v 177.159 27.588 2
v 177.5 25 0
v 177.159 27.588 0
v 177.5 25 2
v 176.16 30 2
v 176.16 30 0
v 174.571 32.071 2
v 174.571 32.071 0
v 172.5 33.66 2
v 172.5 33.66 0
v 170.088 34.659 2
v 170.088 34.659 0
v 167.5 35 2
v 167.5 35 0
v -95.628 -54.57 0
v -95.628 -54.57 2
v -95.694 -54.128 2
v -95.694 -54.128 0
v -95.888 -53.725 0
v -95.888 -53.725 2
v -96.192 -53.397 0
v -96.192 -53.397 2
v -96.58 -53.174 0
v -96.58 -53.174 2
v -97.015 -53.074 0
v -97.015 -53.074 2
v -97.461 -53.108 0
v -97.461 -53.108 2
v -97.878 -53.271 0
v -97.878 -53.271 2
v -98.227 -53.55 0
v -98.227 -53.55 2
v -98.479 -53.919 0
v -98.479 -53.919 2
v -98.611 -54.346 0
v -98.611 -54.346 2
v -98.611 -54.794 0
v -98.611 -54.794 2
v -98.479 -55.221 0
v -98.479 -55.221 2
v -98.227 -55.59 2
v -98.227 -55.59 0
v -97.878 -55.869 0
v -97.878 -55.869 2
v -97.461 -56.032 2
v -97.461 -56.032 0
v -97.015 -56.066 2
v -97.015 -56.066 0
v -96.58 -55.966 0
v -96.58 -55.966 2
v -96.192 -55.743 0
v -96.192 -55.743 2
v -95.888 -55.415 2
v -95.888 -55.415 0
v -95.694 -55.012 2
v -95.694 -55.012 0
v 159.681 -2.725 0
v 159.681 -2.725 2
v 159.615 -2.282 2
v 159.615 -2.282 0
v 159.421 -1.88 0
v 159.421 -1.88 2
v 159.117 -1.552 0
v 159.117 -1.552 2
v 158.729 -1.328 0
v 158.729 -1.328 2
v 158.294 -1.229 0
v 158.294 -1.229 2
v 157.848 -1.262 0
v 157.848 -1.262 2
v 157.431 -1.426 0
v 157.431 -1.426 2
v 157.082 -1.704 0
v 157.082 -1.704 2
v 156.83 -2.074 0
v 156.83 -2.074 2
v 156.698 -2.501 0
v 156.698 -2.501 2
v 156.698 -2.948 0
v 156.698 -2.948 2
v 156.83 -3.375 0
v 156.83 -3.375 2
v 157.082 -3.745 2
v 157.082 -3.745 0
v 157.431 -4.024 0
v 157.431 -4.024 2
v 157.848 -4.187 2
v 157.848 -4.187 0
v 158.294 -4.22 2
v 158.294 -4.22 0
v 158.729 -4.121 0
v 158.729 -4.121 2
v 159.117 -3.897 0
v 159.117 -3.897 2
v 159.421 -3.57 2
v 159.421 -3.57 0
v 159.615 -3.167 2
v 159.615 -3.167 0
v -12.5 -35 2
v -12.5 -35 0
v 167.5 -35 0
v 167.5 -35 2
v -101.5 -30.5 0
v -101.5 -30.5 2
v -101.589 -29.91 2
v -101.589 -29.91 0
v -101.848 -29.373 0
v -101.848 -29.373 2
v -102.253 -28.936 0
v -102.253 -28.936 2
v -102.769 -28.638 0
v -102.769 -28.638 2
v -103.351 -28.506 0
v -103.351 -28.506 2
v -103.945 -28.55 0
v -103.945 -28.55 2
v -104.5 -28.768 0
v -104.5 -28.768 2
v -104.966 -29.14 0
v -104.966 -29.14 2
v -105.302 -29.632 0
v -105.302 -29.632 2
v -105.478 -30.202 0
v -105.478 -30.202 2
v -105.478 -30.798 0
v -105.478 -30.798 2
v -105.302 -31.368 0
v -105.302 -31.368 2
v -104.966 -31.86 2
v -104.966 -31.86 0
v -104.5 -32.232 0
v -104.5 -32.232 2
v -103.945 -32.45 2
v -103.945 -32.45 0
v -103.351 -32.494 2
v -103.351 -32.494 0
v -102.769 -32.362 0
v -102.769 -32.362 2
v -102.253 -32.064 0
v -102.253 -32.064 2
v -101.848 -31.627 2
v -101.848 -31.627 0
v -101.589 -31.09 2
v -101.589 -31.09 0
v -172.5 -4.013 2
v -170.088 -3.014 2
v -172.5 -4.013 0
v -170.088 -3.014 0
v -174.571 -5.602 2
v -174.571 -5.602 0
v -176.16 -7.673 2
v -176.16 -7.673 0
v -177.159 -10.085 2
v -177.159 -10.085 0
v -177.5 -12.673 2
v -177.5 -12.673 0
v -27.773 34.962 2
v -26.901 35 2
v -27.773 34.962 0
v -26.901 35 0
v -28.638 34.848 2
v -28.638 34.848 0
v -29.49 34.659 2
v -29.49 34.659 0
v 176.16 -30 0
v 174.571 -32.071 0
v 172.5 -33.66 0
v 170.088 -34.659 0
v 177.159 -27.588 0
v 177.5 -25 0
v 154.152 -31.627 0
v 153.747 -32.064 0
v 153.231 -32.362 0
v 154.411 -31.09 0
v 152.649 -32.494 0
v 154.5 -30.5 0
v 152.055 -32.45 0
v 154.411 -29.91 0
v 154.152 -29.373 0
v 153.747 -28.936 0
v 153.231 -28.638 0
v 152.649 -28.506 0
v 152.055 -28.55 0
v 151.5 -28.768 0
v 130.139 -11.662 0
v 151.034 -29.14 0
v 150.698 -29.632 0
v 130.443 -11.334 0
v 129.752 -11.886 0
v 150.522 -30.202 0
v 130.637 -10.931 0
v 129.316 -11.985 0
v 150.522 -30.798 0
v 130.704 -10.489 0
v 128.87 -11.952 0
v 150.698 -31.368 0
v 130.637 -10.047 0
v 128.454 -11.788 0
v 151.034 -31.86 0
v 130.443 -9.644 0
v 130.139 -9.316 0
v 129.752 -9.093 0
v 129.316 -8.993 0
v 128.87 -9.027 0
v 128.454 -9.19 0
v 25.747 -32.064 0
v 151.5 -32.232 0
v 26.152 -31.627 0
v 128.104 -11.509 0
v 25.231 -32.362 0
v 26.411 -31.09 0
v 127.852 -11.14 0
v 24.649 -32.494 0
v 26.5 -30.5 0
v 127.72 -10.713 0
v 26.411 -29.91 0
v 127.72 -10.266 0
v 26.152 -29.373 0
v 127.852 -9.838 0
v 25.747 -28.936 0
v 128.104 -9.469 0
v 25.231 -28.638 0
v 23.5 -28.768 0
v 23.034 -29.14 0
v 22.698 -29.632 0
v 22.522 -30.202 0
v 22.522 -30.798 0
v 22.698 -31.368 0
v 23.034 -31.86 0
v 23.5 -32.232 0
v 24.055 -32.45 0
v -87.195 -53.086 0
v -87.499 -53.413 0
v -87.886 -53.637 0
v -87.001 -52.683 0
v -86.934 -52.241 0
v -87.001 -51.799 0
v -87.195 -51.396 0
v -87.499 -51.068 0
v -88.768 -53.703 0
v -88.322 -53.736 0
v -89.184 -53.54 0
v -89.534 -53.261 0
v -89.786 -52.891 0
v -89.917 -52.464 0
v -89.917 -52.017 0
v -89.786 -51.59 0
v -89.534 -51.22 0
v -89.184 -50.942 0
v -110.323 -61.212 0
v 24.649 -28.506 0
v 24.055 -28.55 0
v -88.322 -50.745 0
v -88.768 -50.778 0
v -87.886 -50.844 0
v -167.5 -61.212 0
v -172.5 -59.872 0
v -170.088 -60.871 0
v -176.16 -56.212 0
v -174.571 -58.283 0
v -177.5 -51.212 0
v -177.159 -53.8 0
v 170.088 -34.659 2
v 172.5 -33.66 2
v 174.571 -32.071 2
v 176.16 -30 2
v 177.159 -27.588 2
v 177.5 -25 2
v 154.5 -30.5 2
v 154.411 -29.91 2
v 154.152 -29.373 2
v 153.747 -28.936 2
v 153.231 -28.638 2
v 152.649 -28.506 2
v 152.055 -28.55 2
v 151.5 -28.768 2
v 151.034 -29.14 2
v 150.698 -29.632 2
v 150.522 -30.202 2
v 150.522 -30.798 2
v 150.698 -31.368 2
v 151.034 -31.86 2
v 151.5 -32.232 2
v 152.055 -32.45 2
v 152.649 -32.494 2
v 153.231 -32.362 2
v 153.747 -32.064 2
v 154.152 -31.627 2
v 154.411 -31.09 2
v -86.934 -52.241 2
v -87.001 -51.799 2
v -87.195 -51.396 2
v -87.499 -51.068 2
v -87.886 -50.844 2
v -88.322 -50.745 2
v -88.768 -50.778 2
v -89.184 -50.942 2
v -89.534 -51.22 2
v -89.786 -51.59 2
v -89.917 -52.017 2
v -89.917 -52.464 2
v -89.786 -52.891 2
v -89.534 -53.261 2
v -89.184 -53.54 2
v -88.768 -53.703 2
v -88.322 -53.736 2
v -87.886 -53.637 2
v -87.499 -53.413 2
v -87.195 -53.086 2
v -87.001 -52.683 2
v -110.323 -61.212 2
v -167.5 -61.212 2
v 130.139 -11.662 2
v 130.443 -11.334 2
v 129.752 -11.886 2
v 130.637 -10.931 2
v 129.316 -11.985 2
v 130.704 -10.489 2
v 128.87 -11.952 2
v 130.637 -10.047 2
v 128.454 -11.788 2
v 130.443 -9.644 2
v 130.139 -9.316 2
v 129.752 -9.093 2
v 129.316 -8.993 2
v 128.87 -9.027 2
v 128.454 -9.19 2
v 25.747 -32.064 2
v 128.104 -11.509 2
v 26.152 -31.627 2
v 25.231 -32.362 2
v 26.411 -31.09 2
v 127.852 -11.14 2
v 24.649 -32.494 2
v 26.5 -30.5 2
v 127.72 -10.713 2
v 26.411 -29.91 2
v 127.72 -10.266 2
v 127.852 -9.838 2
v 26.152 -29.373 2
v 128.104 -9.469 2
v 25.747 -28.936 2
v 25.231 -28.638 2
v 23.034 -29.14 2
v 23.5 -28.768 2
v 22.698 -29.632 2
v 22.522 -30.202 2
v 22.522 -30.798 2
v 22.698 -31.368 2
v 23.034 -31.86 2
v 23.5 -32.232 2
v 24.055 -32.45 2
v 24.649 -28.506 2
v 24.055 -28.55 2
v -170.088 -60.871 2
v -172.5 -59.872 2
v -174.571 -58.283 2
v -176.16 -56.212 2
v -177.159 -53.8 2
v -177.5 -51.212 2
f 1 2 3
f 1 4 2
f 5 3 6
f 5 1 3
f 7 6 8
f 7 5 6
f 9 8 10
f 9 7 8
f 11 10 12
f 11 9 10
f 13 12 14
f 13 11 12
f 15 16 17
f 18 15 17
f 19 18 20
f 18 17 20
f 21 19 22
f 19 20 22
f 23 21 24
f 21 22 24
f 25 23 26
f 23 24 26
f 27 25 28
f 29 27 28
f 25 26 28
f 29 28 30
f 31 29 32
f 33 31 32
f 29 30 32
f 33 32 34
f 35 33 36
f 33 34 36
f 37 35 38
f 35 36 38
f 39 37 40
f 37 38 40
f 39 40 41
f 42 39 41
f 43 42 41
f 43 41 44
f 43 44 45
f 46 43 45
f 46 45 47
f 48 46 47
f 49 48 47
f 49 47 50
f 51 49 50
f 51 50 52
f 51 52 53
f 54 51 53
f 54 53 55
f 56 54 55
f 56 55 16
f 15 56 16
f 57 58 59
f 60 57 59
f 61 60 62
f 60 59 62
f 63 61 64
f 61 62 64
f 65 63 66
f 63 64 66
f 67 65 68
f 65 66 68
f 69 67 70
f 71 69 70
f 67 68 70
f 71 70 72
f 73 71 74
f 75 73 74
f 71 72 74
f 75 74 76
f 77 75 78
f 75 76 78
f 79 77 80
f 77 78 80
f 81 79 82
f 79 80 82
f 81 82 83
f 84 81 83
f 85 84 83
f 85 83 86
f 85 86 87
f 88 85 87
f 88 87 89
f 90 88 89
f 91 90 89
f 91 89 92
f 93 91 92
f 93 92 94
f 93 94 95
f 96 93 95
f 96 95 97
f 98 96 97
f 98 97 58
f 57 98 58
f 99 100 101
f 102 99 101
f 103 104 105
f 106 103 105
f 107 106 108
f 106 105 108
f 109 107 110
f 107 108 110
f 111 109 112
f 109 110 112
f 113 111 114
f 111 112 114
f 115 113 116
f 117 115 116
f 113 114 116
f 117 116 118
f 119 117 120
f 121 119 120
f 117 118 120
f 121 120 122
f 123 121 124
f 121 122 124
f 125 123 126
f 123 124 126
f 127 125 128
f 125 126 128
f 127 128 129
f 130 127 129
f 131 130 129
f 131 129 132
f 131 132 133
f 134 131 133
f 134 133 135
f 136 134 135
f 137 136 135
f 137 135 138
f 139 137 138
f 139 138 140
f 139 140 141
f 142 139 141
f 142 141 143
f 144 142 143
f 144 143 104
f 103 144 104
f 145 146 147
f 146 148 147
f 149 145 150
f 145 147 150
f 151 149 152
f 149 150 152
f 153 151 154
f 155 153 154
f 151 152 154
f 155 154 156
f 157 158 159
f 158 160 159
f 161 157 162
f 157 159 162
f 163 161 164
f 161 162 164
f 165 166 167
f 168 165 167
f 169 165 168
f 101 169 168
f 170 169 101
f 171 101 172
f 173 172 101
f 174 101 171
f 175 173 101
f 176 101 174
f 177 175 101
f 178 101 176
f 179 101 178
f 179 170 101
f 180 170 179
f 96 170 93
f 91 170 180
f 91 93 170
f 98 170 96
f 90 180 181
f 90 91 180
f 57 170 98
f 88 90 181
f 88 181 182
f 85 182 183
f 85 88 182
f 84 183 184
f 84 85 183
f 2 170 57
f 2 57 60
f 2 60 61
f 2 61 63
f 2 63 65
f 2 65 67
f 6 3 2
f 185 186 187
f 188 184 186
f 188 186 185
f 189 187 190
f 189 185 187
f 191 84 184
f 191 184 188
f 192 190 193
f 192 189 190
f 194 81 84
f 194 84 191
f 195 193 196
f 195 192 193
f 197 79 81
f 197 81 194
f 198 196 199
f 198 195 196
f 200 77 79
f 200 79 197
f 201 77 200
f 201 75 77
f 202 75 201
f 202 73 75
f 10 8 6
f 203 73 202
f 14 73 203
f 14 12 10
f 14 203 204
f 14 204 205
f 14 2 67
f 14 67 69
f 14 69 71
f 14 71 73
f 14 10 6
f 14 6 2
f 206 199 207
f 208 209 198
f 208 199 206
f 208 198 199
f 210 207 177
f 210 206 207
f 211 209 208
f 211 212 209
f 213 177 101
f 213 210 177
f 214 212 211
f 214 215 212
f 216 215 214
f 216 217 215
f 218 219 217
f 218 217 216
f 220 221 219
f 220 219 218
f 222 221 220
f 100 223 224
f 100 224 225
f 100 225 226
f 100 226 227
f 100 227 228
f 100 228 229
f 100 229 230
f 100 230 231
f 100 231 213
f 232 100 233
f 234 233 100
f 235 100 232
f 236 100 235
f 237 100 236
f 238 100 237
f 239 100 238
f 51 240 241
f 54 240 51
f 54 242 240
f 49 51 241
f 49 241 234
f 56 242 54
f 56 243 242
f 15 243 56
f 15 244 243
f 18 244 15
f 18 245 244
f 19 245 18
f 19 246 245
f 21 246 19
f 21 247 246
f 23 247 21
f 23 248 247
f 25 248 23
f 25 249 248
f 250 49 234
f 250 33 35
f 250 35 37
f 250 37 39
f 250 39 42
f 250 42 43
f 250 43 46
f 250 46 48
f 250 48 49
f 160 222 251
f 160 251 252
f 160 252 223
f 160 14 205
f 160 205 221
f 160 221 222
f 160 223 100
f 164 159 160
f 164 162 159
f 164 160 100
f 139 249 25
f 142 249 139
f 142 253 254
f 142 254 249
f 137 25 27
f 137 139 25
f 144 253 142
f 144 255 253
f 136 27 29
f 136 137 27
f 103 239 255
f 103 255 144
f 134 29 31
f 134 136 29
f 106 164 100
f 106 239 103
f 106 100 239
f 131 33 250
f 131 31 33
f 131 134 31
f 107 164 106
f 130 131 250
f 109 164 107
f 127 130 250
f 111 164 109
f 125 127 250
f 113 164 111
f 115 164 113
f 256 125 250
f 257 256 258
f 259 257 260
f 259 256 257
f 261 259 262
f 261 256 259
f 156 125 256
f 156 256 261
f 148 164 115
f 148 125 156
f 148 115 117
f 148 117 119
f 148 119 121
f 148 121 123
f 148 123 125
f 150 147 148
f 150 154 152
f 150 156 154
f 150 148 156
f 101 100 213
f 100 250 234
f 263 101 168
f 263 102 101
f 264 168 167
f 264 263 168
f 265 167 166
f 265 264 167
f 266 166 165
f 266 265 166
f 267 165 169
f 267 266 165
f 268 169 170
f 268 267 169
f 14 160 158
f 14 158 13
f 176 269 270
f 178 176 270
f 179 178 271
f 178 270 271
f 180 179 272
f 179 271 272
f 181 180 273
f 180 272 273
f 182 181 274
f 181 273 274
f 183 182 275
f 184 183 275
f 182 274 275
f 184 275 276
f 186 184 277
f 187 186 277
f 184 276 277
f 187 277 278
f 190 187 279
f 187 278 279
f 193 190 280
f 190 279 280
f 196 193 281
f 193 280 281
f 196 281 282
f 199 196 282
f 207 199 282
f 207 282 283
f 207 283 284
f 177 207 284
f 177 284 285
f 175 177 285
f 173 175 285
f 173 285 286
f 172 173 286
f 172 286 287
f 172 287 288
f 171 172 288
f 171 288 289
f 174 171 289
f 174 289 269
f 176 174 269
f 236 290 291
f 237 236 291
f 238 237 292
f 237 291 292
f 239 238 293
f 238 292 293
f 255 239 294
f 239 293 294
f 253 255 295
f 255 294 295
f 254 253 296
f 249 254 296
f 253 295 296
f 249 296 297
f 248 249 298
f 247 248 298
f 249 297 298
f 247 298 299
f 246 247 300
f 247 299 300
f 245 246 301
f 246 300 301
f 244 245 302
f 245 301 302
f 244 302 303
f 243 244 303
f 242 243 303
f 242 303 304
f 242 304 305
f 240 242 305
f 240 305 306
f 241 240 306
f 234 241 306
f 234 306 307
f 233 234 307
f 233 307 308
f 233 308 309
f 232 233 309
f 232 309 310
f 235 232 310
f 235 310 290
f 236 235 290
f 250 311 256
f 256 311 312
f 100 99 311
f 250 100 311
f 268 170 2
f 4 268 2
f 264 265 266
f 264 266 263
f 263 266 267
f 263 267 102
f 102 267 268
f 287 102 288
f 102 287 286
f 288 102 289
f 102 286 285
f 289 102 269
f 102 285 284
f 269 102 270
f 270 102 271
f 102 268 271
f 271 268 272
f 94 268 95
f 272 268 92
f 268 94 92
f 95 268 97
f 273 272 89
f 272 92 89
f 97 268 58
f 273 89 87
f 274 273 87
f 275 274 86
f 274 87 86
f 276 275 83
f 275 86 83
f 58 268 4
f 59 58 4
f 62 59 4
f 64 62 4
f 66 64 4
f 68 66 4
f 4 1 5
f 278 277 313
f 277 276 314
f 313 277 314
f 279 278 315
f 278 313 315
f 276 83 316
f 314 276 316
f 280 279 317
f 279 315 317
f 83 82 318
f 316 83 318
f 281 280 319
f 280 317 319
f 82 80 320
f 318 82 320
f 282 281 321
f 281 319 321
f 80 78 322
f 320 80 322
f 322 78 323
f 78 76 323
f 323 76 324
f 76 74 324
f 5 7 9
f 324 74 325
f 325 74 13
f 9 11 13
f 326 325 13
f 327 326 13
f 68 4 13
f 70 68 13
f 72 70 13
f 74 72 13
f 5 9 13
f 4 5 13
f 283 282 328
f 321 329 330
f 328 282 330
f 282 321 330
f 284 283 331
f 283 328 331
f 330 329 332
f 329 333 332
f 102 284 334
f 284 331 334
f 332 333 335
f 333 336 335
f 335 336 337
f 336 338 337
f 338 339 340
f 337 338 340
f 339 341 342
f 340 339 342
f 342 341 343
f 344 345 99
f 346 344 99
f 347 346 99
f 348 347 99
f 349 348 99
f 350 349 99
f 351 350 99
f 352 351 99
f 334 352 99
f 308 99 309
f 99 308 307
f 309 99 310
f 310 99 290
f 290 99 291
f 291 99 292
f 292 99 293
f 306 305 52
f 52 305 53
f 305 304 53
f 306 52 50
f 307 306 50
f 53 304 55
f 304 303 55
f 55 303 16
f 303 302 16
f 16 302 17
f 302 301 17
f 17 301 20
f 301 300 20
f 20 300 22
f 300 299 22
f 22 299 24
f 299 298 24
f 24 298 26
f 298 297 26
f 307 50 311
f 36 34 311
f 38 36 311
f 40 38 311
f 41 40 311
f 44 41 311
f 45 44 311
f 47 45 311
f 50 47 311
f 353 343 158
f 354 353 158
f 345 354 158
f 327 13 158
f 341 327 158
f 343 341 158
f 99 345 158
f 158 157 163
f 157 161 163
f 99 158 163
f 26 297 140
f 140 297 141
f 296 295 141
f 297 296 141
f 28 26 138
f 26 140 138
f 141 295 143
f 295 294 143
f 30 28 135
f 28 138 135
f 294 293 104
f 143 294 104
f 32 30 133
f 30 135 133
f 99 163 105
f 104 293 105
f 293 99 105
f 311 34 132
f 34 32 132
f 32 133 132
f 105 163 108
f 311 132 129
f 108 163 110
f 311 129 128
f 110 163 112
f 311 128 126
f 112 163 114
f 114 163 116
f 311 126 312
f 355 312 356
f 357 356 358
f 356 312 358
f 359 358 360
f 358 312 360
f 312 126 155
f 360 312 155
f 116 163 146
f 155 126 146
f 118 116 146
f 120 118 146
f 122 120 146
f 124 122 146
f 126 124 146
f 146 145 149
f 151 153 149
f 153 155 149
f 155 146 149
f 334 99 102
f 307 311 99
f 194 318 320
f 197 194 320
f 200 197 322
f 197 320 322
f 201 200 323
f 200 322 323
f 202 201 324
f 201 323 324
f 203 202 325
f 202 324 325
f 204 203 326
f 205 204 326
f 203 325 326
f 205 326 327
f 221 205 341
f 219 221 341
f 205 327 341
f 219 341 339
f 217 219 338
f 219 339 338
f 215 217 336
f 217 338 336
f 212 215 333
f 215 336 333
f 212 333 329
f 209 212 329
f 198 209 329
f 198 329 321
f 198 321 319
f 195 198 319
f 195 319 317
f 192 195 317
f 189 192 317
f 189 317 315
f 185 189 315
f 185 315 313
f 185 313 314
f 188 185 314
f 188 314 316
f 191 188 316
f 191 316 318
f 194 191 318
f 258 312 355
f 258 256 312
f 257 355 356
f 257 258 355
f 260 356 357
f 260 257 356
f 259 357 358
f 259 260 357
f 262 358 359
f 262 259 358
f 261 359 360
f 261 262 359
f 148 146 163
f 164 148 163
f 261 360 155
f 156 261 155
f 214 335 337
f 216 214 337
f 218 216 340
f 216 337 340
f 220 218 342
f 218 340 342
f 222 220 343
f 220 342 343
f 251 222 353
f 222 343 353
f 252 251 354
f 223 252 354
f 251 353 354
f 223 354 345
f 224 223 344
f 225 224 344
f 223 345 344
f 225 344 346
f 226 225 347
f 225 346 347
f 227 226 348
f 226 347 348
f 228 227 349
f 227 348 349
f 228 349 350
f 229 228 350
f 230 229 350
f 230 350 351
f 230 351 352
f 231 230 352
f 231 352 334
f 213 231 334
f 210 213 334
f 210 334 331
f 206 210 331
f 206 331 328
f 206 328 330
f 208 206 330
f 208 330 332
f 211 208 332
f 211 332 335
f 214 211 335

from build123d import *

# Parameters (mm, degrees)
SKETCH_1_W          = 355
SKETCH_1_H          = 70
EXTRUDE_1_DEPTH     = 2
EXTRUDE_2_DEPTH     = 2
SKETCH_3_R          = 2
CUT_EXTRUDE_1_DEPTH = 195.38294737
SKETCH_4_R          = 1.5
CUT_EXTRUDE_2_DEPTH = 195.38294737
CUT_EXTRUDE_3_DEPTH = 2
CUT_EXTRUDE_4_DEPTH = 2
FILLET_1_R          = 10


with BuildPart() as part:
    # 草图1 → 凸台-拉伸1 (new body)
    with BuildSketch(Plane.XY):
        Rectangle(SKETCH_1_W, SKETCH_1_H)
    extrude(amount=EXTRUDE_1_DEPTH)

    # 草图2 → 凸台-拉伸2 (add)
    with BuildSketch(Plane.XY.offset(2)):
        Polygon((-12.5, -35), (-177.5, -79.211616751), (-177.5, -35), align=None)
    extrude(amount=-EXTRUDE_2_DEPTH)

    # 草图3 → 切除-拉伸1 (cut, through all)
    with BuildSketch(Plane.XY.offset(2)):
        with Locations((152.5, -30.5)):
            Circle(SKETCH_3_R)
        with Locations((24.5, -30.5)):
            Circle(SKETCH_3_R)
        with Locations((-103.5, -30.5)):
            Circle(SKETCH_3_R)
    extrude(amount=-CUT_EXTRUDE_1_DEPTH, mode=Mode.SUBTRACT)

    # 草图4 → 切除-拉伸2 (cut, through all)
    with BuildSketch(Plane.XY.offset(2)):
        with Locations((-97.127512474, -54.570045084)):
            Circle(SKETCH_4_R)
        with Locations((-88.434180038, -52.240673678)):
            Circle(SKETCH_4_R)
        with Locations((129.203708686, -10.489196039)):
            Circle(SKETCH_4_R)
        with Locations((158.181483474, -2.724624685)):
            Circle(SKETCH_4_R)
    extrude(amount=-CUT_EXTRUDE_2_DEPTH, mode=Mode.SUBTRACT)

    # 草图5 → 切除-拉伸3 (cut)
    with BuildSketch(Plane.XY.offset(2)):
        Polygon((-177.5, -5), (-28.217967697, 35), (-177.5, 35), align=None)
    extrude(amount=-CUT_EXTRUDE_3_DEPTH, mode=Mode.SUBTRACT)

    # 草图6 → 切除-拉伸4 (cut)
    with BuildSketch(Plane.XY.offset(2)):
        Polygon((-110.323085464, -61.211616751), (-177.5, -61.211616751), (-177.5, -79.211616751), align=None)
    extrude(amount=-CUT_EXTRUDE_4_DEPTH, mode=Mode.SUBTRACT)

    # 圆角1
    fillet_1_edges = [part.edges().sort_by_distance(p)[0] for p in [
        (-177.5, -5, 1),
        (-28.217967697, 35, 1),
        (-177.5, -61.211616751, 1),
        (177.5, -35, 1),
        (177.5, 35, 1),
    ]]
    fillet(fillet_1_edges, radius=FILLET_1_R)


solid = part.part
